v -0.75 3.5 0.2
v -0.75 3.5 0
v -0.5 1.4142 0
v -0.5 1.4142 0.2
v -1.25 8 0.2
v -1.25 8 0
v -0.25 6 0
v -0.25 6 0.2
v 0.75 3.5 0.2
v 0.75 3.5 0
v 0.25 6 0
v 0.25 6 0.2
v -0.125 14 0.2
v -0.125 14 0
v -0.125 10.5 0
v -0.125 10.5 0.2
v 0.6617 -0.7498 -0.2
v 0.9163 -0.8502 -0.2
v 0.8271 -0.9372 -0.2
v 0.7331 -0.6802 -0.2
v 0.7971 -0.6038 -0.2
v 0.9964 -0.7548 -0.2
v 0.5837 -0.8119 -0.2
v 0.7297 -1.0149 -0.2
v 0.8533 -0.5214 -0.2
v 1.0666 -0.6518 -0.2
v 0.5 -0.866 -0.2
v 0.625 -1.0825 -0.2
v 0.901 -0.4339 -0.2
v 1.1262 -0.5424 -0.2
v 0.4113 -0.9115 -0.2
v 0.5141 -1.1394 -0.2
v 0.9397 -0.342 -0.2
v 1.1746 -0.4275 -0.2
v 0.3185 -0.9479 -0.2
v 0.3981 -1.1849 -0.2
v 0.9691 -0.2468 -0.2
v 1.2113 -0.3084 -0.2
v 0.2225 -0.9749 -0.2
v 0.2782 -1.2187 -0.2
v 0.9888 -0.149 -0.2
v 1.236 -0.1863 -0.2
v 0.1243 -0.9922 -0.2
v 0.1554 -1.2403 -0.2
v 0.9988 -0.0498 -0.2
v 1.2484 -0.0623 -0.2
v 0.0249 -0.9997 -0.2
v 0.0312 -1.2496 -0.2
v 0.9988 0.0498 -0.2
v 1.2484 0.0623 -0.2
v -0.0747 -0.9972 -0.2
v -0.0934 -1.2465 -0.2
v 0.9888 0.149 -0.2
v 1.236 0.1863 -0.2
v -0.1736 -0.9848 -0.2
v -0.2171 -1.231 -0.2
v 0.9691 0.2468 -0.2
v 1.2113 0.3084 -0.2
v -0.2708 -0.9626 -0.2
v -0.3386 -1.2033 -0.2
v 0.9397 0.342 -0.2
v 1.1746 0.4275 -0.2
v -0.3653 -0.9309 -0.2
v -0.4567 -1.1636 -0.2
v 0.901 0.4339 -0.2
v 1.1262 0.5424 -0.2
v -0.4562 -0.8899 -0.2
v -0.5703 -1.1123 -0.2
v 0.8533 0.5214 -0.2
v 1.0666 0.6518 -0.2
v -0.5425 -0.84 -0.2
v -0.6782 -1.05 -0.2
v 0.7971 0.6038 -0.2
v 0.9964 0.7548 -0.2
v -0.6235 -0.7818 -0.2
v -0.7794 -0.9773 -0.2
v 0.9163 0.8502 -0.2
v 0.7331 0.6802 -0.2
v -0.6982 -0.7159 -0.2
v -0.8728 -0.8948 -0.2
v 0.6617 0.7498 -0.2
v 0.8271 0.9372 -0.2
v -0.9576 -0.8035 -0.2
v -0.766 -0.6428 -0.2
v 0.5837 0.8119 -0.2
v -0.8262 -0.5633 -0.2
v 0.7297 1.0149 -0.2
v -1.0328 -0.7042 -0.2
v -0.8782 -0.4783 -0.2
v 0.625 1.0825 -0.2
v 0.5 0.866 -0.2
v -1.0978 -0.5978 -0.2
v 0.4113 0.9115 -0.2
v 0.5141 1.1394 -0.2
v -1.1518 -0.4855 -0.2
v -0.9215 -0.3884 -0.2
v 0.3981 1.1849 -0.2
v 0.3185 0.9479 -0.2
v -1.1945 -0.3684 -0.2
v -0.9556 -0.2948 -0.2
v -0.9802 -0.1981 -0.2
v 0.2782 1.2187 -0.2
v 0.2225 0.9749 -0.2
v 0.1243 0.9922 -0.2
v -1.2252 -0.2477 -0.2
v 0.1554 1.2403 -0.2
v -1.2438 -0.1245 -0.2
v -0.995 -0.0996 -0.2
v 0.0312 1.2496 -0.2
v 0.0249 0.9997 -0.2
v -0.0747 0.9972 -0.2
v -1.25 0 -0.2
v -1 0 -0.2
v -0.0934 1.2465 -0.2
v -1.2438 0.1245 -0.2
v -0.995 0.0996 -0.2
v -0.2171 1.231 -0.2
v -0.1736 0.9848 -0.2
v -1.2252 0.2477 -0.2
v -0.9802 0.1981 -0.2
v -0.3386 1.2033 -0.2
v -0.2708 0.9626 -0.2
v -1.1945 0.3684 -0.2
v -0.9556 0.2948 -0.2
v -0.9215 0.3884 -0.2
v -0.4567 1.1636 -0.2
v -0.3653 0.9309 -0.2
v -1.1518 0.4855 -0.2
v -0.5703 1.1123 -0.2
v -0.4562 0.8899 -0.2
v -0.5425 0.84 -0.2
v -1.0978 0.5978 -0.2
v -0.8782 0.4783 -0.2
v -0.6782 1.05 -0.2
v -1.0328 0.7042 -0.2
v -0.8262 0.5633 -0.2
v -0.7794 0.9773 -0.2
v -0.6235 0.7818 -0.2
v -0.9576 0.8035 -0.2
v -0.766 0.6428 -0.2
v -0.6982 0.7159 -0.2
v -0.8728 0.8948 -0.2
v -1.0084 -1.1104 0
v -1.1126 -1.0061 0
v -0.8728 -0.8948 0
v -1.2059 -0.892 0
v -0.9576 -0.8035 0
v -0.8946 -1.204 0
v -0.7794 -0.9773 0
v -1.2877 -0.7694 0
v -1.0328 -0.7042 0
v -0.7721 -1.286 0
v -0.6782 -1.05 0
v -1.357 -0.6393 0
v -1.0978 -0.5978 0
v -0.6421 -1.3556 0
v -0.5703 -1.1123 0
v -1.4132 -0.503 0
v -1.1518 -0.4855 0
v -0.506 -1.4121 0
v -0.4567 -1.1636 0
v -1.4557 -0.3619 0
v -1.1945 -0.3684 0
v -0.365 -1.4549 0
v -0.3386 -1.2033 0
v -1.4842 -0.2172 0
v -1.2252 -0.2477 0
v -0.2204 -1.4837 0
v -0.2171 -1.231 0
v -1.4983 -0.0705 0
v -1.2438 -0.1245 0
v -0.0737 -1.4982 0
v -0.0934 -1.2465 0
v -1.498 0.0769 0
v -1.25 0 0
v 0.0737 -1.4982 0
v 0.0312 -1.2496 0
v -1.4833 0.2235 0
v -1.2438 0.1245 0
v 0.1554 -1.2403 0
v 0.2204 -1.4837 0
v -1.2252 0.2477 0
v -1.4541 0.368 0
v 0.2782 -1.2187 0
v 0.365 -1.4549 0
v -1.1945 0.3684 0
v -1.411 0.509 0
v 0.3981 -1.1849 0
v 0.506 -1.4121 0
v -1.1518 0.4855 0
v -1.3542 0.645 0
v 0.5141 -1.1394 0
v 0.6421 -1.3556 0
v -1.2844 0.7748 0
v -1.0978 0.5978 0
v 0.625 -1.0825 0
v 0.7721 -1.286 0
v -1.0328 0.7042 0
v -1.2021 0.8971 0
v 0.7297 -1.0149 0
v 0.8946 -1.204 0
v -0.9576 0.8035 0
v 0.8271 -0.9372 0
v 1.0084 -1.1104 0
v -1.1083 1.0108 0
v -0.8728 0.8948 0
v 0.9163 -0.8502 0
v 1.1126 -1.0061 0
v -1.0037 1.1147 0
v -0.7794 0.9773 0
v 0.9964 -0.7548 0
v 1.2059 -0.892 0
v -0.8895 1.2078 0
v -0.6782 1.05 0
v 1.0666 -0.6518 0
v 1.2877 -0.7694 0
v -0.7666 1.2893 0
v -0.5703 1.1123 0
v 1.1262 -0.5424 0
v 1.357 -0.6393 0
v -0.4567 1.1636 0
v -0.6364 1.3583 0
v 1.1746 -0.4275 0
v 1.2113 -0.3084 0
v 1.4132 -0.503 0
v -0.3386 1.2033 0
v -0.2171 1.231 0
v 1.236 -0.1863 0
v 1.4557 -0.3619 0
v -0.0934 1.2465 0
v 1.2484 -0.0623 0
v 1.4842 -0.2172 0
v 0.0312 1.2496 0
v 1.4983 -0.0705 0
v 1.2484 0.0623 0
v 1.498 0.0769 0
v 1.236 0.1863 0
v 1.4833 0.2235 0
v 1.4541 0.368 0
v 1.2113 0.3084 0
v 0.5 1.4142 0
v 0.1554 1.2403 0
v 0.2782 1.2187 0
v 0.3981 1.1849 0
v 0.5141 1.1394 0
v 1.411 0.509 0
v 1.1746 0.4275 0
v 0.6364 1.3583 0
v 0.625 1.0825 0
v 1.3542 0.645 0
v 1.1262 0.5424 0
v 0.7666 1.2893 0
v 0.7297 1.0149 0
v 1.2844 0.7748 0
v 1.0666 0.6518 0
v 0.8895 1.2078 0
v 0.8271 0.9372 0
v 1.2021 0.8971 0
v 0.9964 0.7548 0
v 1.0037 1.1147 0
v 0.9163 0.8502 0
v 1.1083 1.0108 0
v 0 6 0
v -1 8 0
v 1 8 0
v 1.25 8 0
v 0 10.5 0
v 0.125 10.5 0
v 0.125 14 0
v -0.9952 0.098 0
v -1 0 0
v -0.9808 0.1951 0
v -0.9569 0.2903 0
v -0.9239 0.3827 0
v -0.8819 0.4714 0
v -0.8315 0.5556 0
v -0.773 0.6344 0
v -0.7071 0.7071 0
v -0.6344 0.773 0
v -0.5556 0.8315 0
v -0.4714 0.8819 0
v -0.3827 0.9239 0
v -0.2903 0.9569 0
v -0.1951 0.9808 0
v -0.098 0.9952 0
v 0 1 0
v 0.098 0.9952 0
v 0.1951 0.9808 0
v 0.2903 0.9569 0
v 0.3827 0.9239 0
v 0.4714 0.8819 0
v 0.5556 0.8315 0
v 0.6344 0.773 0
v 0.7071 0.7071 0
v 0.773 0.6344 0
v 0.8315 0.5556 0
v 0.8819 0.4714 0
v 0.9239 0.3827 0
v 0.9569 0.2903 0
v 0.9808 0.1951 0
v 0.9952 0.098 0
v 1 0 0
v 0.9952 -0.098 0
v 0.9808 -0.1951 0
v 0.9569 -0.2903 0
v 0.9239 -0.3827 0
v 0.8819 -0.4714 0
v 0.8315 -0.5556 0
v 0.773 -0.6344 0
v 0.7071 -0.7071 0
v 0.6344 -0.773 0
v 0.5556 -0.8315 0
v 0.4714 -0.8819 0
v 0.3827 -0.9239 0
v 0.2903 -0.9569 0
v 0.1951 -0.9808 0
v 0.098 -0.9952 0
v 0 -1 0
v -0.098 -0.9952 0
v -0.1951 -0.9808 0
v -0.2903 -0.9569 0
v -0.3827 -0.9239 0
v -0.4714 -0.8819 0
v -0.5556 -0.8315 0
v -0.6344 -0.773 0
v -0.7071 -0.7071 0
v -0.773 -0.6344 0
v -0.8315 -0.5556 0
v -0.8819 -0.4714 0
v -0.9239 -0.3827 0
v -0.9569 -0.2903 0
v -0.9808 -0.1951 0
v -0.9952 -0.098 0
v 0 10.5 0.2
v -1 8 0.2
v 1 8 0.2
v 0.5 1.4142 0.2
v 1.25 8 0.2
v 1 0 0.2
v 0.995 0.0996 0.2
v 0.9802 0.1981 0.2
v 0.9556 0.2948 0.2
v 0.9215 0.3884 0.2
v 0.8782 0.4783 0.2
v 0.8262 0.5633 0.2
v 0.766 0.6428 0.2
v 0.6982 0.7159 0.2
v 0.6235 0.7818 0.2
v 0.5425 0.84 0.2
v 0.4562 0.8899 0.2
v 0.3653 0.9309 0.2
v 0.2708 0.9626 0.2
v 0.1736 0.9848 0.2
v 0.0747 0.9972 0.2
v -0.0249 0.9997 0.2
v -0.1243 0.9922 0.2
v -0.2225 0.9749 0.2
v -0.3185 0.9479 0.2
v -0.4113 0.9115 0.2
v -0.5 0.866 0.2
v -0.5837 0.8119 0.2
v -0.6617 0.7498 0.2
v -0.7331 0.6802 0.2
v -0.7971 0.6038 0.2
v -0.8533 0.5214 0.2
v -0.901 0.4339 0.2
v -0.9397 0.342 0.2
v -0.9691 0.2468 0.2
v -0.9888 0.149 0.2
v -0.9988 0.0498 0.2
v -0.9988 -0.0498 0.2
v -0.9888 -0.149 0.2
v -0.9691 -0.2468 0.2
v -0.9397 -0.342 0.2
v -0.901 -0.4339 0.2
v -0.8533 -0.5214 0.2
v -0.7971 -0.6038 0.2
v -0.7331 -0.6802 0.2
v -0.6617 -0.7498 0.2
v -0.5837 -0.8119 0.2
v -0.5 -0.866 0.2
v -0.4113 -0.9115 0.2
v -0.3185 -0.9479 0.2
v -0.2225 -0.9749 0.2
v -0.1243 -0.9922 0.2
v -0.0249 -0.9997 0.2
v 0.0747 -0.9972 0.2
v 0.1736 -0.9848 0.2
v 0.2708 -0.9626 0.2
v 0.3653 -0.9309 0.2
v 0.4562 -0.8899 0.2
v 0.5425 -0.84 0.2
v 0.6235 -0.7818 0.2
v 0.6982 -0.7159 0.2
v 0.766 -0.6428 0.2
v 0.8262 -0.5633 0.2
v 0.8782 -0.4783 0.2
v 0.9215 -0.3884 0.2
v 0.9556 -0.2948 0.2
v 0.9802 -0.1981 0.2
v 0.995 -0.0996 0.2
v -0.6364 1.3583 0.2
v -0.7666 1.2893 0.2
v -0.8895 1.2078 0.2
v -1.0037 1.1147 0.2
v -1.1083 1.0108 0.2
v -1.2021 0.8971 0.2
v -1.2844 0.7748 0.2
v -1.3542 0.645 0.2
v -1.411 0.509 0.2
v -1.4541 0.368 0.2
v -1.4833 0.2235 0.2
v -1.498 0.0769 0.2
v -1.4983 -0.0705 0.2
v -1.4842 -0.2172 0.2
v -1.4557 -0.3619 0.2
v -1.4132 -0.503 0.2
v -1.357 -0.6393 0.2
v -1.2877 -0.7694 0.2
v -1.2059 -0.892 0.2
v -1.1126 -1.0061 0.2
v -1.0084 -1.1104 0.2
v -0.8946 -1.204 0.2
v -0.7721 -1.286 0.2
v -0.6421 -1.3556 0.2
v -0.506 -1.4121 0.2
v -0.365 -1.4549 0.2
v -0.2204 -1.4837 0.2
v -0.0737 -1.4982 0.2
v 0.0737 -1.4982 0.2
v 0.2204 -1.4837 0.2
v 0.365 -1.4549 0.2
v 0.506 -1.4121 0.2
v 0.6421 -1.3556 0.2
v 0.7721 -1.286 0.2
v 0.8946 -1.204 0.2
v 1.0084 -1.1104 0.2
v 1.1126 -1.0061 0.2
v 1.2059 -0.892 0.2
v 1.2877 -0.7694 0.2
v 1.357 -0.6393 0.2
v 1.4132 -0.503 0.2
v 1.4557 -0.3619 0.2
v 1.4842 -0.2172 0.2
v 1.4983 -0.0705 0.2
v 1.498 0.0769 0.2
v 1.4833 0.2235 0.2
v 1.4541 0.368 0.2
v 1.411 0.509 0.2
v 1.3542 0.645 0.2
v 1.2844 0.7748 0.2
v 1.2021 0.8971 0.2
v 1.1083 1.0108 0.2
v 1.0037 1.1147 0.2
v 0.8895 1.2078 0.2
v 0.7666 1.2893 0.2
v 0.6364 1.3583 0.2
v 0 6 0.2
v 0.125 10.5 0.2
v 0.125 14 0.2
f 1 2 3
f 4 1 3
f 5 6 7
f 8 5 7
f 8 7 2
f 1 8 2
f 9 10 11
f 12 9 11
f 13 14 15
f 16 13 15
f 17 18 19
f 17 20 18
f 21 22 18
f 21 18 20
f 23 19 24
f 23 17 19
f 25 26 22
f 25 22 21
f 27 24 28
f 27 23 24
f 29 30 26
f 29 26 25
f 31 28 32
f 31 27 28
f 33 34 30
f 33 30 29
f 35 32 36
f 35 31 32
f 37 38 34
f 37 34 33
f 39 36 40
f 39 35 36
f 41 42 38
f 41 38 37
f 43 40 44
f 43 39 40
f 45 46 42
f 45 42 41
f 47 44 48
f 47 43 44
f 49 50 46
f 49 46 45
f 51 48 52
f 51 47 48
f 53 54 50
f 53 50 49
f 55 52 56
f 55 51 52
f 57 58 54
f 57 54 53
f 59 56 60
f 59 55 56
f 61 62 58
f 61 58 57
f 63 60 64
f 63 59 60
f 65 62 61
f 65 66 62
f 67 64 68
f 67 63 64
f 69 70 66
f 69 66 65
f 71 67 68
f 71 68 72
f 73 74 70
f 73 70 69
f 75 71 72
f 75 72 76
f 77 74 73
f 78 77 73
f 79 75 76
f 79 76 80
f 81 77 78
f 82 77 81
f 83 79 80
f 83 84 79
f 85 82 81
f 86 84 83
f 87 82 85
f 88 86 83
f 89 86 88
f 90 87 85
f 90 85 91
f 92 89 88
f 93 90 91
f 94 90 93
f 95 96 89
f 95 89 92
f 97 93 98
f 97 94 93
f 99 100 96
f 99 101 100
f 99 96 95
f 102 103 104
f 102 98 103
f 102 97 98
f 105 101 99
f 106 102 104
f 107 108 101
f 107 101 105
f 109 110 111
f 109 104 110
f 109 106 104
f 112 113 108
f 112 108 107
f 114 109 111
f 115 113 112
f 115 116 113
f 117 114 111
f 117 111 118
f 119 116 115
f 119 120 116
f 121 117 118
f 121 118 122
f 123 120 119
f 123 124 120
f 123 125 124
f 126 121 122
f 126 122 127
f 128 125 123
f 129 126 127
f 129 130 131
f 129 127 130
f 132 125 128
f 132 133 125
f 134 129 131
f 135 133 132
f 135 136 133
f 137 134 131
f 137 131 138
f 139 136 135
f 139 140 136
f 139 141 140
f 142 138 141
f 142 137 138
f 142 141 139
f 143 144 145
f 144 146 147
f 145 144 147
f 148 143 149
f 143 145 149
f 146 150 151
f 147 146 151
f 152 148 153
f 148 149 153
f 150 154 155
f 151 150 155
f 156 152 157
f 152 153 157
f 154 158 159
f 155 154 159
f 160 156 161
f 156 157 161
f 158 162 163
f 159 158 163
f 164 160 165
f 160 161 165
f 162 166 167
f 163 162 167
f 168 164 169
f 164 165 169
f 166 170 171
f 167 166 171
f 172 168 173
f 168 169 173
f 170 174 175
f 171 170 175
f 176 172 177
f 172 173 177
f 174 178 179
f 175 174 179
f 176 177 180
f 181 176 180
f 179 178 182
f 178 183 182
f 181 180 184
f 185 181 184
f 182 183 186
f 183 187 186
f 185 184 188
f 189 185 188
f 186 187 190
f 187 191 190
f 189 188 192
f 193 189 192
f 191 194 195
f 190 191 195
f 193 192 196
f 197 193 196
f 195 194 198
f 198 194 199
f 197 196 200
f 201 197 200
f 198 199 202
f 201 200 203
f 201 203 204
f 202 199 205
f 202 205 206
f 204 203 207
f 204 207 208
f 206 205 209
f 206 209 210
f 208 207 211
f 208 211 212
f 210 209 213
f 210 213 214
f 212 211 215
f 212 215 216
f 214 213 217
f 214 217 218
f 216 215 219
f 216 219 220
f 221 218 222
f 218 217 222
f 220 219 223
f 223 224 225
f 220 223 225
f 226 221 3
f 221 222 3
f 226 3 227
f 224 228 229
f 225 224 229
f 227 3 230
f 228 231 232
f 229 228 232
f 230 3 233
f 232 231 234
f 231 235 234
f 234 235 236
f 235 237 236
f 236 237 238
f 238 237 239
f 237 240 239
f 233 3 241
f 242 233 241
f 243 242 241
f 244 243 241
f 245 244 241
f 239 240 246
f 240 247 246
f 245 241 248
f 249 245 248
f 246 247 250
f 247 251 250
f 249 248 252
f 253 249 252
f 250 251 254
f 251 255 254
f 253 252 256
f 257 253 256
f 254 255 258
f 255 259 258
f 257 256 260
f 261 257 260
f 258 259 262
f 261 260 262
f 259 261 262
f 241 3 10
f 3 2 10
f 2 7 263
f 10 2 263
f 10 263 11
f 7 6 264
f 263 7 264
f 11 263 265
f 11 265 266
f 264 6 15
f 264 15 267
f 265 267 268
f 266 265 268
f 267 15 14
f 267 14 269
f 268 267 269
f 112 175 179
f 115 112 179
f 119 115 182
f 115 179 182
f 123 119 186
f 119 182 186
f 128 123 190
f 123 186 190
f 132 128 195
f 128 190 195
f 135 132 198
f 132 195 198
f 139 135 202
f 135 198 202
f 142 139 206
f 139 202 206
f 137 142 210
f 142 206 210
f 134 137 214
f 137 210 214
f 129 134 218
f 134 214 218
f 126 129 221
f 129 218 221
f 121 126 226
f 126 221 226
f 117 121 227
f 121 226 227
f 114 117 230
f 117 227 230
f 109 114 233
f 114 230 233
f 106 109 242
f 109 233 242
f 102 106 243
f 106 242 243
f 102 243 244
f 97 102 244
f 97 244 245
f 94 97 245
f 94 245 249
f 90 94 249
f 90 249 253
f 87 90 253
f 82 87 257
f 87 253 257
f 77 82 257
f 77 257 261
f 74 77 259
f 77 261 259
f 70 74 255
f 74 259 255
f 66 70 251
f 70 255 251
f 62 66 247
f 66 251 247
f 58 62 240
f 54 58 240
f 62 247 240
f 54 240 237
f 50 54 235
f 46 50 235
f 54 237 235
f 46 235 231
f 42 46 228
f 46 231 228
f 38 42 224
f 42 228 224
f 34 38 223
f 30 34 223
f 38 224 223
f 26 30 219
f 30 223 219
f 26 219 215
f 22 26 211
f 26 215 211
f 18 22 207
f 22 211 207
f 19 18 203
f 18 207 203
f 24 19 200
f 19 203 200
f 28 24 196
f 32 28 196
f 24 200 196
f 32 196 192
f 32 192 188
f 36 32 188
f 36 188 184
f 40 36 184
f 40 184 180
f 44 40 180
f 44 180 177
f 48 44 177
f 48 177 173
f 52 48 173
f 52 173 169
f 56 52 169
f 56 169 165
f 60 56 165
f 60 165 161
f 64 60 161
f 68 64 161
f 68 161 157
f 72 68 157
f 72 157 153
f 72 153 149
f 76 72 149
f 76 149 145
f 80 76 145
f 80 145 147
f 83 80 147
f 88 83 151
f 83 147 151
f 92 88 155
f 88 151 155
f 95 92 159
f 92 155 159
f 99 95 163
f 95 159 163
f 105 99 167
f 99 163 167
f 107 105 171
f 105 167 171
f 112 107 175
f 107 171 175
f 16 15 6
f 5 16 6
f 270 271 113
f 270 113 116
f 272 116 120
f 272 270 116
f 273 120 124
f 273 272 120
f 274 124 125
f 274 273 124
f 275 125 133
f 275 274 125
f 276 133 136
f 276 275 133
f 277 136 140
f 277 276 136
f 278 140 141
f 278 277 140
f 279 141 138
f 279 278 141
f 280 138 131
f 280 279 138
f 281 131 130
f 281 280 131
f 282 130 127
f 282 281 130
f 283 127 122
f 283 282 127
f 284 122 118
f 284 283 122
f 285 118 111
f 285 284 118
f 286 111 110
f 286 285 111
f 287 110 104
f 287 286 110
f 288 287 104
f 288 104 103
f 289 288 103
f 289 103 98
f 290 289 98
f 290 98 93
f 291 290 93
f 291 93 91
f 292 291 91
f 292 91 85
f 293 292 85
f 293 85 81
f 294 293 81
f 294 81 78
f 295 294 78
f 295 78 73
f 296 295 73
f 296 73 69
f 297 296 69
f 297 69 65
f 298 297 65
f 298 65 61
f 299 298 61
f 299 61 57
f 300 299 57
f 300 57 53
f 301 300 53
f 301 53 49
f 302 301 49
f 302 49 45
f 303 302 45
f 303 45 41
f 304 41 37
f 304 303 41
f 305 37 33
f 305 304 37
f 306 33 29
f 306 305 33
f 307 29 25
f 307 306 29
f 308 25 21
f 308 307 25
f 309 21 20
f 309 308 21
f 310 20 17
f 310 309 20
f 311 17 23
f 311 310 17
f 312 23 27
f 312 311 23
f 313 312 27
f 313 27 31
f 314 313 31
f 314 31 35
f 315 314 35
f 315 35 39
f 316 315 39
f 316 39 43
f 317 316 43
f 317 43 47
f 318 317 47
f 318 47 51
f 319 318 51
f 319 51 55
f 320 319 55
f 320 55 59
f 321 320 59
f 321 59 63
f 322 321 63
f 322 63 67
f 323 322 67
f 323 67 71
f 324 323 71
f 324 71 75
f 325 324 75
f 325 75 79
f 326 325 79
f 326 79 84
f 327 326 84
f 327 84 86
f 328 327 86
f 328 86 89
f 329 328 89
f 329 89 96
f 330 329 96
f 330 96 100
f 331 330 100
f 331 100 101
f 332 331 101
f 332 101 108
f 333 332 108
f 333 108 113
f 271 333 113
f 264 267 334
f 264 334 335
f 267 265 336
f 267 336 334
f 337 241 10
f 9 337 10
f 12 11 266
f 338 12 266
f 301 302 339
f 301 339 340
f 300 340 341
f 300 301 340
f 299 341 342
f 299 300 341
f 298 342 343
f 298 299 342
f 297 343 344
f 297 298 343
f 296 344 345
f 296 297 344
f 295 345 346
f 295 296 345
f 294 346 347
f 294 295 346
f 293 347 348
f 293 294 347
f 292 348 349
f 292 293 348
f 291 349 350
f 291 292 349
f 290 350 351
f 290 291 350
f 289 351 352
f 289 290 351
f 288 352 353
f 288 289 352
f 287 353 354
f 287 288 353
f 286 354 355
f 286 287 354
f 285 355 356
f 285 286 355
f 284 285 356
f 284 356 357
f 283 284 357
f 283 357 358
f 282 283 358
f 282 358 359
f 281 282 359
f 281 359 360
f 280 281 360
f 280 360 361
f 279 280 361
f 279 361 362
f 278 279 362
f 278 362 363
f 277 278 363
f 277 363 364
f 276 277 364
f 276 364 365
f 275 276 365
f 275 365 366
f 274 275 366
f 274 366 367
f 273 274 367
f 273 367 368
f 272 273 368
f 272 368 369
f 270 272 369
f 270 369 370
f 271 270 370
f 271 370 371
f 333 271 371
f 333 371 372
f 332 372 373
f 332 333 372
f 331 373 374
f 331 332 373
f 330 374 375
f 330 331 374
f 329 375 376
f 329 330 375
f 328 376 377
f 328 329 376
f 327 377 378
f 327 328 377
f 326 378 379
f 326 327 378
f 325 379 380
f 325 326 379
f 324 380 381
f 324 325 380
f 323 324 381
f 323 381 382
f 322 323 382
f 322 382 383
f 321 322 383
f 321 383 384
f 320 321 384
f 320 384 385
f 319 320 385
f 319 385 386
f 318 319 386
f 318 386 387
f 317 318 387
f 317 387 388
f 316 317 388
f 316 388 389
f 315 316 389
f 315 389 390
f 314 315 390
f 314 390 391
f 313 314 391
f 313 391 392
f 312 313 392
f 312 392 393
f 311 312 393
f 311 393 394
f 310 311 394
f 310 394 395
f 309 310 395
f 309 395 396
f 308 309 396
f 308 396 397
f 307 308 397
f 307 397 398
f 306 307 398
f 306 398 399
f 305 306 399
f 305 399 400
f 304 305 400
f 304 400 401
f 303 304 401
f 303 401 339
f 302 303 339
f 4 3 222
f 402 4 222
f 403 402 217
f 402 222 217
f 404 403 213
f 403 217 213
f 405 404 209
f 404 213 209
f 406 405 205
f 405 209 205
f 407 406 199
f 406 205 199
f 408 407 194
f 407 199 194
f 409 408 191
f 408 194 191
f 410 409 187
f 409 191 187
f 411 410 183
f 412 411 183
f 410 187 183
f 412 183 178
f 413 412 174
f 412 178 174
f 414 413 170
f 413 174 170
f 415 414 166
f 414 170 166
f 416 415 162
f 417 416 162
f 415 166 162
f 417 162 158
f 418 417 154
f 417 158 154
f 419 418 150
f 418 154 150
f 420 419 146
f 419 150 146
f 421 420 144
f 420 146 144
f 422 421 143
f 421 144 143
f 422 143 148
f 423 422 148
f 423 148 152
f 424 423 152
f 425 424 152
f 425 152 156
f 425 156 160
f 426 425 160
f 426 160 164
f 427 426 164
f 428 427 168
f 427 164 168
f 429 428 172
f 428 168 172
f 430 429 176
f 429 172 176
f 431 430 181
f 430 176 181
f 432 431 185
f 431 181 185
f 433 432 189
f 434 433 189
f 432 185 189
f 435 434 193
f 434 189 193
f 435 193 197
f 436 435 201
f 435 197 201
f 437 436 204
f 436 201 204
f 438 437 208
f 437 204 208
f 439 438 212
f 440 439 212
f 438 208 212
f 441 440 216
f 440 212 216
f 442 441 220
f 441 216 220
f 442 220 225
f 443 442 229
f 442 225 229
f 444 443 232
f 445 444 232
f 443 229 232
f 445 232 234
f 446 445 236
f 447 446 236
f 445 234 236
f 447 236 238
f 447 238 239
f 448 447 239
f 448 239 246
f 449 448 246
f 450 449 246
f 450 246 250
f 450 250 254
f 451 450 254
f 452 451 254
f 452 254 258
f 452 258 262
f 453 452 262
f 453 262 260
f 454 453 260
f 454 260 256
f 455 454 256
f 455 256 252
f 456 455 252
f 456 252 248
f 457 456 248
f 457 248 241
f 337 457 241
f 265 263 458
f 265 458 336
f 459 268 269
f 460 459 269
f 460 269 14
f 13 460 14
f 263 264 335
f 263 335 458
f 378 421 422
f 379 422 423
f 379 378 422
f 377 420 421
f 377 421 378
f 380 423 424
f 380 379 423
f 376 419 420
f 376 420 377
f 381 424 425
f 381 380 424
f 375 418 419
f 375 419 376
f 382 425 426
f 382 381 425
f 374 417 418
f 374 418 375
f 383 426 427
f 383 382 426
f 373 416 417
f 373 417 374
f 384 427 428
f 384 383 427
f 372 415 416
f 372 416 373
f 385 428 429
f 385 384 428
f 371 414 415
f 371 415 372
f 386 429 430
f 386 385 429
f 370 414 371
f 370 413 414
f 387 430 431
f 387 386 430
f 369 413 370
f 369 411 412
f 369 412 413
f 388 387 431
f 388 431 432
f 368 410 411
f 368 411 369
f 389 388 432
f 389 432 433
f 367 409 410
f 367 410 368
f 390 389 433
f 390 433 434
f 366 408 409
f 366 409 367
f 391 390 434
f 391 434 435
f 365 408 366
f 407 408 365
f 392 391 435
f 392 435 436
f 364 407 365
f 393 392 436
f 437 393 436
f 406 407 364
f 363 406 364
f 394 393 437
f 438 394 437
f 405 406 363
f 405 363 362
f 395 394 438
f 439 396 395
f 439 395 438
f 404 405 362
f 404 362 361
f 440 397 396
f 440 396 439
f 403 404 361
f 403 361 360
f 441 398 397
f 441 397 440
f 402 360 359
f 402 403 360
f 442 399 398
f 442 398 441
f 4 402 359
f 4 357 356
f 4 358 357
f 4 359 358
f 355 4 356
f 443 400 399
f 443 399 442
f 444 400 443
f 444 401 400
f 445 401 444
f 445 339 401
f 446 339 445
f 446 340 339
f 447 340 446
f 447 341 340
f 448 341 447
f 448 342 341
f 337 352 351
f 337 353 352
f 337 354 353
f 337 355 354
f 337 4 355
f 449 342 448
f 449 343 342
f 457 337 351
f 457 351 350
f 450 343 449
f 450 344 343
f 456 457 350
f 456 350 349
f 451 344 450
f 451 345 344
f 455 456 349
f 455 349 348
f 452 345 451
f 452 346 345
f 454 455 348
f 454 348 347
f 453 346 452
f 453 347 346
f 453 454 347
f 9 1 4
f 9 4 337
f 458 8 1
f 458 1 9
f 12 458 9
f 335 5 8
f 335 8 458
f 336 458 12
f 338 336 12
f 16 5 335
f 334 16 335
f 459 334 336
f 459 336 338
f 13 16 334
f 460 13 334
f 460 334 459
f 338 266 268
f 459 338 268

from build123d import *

# Parameters (mm, degrees)
CROQUIS1_R              = 1
SALIENTE_EXTRUIR1_DEPTH = 0.2
CROQUIS2_R              = 1.25
CROQUIS2_R_2            = 1
SALIENTE_EXTRUIR2_DEPTH = 0.2


with BuildPart() as part:
    # Croquis1 → Saliente-Extruir1 (new body)
    with BuildSketch(Plane.XY):
        with BuildLine():
            Line((0.5, 1.414213562), (0.75, 3.5))
            Line((0.75, 3.5), (0.25, 6))
            Line((0.25, 6), (1.25, 8))
            Line((1.25, 8), (0.125, 10.5))
            Line((0.125, 10.5), (0.125, 14))
            Line((0.125, 14), (-0.125, 14))
            Line((-0.125, 14), (-0.125, 10.5))
            Line((-0.125, 10.5), (-1.25, 8))
            Line((-1.25, 8), (-0.25, 6))
            Line((-0.25, 6), (-0.75, 3.5))
            Line((-0.75, 3.5), (-0.5, 1.414213562))
            ThreePointArc((-0.5, 1.414213562), (0, -1.5), (0.5, 1.414213562))
        make_face()
        Circle(CROQUIS1_R, mode=Mode.SUBTRACT)
        Polygon((0, 6), (1, 8), (0, 10.5), (-1, 8), align=None, mode=Mode.SUBTRACT)
    extrude(amount=SALIENTE_EXTRUIR1_DEPTH)

    # Croquis2 → Saliente-Extruir2 (add)
    with BuildSketch(Plane(origin=(0, 0, 0), x_dir=(-1, 0, 0), z_dir=(0, 0, -1))):
        Circle(CROQUIS2_R)
        Circle(CROQUIS2_R_2, mode=Mode.SUBTRACT)
    extrude(amount=SALIENTE_EXTRUIR2_DEPTH)


solid = part.part
